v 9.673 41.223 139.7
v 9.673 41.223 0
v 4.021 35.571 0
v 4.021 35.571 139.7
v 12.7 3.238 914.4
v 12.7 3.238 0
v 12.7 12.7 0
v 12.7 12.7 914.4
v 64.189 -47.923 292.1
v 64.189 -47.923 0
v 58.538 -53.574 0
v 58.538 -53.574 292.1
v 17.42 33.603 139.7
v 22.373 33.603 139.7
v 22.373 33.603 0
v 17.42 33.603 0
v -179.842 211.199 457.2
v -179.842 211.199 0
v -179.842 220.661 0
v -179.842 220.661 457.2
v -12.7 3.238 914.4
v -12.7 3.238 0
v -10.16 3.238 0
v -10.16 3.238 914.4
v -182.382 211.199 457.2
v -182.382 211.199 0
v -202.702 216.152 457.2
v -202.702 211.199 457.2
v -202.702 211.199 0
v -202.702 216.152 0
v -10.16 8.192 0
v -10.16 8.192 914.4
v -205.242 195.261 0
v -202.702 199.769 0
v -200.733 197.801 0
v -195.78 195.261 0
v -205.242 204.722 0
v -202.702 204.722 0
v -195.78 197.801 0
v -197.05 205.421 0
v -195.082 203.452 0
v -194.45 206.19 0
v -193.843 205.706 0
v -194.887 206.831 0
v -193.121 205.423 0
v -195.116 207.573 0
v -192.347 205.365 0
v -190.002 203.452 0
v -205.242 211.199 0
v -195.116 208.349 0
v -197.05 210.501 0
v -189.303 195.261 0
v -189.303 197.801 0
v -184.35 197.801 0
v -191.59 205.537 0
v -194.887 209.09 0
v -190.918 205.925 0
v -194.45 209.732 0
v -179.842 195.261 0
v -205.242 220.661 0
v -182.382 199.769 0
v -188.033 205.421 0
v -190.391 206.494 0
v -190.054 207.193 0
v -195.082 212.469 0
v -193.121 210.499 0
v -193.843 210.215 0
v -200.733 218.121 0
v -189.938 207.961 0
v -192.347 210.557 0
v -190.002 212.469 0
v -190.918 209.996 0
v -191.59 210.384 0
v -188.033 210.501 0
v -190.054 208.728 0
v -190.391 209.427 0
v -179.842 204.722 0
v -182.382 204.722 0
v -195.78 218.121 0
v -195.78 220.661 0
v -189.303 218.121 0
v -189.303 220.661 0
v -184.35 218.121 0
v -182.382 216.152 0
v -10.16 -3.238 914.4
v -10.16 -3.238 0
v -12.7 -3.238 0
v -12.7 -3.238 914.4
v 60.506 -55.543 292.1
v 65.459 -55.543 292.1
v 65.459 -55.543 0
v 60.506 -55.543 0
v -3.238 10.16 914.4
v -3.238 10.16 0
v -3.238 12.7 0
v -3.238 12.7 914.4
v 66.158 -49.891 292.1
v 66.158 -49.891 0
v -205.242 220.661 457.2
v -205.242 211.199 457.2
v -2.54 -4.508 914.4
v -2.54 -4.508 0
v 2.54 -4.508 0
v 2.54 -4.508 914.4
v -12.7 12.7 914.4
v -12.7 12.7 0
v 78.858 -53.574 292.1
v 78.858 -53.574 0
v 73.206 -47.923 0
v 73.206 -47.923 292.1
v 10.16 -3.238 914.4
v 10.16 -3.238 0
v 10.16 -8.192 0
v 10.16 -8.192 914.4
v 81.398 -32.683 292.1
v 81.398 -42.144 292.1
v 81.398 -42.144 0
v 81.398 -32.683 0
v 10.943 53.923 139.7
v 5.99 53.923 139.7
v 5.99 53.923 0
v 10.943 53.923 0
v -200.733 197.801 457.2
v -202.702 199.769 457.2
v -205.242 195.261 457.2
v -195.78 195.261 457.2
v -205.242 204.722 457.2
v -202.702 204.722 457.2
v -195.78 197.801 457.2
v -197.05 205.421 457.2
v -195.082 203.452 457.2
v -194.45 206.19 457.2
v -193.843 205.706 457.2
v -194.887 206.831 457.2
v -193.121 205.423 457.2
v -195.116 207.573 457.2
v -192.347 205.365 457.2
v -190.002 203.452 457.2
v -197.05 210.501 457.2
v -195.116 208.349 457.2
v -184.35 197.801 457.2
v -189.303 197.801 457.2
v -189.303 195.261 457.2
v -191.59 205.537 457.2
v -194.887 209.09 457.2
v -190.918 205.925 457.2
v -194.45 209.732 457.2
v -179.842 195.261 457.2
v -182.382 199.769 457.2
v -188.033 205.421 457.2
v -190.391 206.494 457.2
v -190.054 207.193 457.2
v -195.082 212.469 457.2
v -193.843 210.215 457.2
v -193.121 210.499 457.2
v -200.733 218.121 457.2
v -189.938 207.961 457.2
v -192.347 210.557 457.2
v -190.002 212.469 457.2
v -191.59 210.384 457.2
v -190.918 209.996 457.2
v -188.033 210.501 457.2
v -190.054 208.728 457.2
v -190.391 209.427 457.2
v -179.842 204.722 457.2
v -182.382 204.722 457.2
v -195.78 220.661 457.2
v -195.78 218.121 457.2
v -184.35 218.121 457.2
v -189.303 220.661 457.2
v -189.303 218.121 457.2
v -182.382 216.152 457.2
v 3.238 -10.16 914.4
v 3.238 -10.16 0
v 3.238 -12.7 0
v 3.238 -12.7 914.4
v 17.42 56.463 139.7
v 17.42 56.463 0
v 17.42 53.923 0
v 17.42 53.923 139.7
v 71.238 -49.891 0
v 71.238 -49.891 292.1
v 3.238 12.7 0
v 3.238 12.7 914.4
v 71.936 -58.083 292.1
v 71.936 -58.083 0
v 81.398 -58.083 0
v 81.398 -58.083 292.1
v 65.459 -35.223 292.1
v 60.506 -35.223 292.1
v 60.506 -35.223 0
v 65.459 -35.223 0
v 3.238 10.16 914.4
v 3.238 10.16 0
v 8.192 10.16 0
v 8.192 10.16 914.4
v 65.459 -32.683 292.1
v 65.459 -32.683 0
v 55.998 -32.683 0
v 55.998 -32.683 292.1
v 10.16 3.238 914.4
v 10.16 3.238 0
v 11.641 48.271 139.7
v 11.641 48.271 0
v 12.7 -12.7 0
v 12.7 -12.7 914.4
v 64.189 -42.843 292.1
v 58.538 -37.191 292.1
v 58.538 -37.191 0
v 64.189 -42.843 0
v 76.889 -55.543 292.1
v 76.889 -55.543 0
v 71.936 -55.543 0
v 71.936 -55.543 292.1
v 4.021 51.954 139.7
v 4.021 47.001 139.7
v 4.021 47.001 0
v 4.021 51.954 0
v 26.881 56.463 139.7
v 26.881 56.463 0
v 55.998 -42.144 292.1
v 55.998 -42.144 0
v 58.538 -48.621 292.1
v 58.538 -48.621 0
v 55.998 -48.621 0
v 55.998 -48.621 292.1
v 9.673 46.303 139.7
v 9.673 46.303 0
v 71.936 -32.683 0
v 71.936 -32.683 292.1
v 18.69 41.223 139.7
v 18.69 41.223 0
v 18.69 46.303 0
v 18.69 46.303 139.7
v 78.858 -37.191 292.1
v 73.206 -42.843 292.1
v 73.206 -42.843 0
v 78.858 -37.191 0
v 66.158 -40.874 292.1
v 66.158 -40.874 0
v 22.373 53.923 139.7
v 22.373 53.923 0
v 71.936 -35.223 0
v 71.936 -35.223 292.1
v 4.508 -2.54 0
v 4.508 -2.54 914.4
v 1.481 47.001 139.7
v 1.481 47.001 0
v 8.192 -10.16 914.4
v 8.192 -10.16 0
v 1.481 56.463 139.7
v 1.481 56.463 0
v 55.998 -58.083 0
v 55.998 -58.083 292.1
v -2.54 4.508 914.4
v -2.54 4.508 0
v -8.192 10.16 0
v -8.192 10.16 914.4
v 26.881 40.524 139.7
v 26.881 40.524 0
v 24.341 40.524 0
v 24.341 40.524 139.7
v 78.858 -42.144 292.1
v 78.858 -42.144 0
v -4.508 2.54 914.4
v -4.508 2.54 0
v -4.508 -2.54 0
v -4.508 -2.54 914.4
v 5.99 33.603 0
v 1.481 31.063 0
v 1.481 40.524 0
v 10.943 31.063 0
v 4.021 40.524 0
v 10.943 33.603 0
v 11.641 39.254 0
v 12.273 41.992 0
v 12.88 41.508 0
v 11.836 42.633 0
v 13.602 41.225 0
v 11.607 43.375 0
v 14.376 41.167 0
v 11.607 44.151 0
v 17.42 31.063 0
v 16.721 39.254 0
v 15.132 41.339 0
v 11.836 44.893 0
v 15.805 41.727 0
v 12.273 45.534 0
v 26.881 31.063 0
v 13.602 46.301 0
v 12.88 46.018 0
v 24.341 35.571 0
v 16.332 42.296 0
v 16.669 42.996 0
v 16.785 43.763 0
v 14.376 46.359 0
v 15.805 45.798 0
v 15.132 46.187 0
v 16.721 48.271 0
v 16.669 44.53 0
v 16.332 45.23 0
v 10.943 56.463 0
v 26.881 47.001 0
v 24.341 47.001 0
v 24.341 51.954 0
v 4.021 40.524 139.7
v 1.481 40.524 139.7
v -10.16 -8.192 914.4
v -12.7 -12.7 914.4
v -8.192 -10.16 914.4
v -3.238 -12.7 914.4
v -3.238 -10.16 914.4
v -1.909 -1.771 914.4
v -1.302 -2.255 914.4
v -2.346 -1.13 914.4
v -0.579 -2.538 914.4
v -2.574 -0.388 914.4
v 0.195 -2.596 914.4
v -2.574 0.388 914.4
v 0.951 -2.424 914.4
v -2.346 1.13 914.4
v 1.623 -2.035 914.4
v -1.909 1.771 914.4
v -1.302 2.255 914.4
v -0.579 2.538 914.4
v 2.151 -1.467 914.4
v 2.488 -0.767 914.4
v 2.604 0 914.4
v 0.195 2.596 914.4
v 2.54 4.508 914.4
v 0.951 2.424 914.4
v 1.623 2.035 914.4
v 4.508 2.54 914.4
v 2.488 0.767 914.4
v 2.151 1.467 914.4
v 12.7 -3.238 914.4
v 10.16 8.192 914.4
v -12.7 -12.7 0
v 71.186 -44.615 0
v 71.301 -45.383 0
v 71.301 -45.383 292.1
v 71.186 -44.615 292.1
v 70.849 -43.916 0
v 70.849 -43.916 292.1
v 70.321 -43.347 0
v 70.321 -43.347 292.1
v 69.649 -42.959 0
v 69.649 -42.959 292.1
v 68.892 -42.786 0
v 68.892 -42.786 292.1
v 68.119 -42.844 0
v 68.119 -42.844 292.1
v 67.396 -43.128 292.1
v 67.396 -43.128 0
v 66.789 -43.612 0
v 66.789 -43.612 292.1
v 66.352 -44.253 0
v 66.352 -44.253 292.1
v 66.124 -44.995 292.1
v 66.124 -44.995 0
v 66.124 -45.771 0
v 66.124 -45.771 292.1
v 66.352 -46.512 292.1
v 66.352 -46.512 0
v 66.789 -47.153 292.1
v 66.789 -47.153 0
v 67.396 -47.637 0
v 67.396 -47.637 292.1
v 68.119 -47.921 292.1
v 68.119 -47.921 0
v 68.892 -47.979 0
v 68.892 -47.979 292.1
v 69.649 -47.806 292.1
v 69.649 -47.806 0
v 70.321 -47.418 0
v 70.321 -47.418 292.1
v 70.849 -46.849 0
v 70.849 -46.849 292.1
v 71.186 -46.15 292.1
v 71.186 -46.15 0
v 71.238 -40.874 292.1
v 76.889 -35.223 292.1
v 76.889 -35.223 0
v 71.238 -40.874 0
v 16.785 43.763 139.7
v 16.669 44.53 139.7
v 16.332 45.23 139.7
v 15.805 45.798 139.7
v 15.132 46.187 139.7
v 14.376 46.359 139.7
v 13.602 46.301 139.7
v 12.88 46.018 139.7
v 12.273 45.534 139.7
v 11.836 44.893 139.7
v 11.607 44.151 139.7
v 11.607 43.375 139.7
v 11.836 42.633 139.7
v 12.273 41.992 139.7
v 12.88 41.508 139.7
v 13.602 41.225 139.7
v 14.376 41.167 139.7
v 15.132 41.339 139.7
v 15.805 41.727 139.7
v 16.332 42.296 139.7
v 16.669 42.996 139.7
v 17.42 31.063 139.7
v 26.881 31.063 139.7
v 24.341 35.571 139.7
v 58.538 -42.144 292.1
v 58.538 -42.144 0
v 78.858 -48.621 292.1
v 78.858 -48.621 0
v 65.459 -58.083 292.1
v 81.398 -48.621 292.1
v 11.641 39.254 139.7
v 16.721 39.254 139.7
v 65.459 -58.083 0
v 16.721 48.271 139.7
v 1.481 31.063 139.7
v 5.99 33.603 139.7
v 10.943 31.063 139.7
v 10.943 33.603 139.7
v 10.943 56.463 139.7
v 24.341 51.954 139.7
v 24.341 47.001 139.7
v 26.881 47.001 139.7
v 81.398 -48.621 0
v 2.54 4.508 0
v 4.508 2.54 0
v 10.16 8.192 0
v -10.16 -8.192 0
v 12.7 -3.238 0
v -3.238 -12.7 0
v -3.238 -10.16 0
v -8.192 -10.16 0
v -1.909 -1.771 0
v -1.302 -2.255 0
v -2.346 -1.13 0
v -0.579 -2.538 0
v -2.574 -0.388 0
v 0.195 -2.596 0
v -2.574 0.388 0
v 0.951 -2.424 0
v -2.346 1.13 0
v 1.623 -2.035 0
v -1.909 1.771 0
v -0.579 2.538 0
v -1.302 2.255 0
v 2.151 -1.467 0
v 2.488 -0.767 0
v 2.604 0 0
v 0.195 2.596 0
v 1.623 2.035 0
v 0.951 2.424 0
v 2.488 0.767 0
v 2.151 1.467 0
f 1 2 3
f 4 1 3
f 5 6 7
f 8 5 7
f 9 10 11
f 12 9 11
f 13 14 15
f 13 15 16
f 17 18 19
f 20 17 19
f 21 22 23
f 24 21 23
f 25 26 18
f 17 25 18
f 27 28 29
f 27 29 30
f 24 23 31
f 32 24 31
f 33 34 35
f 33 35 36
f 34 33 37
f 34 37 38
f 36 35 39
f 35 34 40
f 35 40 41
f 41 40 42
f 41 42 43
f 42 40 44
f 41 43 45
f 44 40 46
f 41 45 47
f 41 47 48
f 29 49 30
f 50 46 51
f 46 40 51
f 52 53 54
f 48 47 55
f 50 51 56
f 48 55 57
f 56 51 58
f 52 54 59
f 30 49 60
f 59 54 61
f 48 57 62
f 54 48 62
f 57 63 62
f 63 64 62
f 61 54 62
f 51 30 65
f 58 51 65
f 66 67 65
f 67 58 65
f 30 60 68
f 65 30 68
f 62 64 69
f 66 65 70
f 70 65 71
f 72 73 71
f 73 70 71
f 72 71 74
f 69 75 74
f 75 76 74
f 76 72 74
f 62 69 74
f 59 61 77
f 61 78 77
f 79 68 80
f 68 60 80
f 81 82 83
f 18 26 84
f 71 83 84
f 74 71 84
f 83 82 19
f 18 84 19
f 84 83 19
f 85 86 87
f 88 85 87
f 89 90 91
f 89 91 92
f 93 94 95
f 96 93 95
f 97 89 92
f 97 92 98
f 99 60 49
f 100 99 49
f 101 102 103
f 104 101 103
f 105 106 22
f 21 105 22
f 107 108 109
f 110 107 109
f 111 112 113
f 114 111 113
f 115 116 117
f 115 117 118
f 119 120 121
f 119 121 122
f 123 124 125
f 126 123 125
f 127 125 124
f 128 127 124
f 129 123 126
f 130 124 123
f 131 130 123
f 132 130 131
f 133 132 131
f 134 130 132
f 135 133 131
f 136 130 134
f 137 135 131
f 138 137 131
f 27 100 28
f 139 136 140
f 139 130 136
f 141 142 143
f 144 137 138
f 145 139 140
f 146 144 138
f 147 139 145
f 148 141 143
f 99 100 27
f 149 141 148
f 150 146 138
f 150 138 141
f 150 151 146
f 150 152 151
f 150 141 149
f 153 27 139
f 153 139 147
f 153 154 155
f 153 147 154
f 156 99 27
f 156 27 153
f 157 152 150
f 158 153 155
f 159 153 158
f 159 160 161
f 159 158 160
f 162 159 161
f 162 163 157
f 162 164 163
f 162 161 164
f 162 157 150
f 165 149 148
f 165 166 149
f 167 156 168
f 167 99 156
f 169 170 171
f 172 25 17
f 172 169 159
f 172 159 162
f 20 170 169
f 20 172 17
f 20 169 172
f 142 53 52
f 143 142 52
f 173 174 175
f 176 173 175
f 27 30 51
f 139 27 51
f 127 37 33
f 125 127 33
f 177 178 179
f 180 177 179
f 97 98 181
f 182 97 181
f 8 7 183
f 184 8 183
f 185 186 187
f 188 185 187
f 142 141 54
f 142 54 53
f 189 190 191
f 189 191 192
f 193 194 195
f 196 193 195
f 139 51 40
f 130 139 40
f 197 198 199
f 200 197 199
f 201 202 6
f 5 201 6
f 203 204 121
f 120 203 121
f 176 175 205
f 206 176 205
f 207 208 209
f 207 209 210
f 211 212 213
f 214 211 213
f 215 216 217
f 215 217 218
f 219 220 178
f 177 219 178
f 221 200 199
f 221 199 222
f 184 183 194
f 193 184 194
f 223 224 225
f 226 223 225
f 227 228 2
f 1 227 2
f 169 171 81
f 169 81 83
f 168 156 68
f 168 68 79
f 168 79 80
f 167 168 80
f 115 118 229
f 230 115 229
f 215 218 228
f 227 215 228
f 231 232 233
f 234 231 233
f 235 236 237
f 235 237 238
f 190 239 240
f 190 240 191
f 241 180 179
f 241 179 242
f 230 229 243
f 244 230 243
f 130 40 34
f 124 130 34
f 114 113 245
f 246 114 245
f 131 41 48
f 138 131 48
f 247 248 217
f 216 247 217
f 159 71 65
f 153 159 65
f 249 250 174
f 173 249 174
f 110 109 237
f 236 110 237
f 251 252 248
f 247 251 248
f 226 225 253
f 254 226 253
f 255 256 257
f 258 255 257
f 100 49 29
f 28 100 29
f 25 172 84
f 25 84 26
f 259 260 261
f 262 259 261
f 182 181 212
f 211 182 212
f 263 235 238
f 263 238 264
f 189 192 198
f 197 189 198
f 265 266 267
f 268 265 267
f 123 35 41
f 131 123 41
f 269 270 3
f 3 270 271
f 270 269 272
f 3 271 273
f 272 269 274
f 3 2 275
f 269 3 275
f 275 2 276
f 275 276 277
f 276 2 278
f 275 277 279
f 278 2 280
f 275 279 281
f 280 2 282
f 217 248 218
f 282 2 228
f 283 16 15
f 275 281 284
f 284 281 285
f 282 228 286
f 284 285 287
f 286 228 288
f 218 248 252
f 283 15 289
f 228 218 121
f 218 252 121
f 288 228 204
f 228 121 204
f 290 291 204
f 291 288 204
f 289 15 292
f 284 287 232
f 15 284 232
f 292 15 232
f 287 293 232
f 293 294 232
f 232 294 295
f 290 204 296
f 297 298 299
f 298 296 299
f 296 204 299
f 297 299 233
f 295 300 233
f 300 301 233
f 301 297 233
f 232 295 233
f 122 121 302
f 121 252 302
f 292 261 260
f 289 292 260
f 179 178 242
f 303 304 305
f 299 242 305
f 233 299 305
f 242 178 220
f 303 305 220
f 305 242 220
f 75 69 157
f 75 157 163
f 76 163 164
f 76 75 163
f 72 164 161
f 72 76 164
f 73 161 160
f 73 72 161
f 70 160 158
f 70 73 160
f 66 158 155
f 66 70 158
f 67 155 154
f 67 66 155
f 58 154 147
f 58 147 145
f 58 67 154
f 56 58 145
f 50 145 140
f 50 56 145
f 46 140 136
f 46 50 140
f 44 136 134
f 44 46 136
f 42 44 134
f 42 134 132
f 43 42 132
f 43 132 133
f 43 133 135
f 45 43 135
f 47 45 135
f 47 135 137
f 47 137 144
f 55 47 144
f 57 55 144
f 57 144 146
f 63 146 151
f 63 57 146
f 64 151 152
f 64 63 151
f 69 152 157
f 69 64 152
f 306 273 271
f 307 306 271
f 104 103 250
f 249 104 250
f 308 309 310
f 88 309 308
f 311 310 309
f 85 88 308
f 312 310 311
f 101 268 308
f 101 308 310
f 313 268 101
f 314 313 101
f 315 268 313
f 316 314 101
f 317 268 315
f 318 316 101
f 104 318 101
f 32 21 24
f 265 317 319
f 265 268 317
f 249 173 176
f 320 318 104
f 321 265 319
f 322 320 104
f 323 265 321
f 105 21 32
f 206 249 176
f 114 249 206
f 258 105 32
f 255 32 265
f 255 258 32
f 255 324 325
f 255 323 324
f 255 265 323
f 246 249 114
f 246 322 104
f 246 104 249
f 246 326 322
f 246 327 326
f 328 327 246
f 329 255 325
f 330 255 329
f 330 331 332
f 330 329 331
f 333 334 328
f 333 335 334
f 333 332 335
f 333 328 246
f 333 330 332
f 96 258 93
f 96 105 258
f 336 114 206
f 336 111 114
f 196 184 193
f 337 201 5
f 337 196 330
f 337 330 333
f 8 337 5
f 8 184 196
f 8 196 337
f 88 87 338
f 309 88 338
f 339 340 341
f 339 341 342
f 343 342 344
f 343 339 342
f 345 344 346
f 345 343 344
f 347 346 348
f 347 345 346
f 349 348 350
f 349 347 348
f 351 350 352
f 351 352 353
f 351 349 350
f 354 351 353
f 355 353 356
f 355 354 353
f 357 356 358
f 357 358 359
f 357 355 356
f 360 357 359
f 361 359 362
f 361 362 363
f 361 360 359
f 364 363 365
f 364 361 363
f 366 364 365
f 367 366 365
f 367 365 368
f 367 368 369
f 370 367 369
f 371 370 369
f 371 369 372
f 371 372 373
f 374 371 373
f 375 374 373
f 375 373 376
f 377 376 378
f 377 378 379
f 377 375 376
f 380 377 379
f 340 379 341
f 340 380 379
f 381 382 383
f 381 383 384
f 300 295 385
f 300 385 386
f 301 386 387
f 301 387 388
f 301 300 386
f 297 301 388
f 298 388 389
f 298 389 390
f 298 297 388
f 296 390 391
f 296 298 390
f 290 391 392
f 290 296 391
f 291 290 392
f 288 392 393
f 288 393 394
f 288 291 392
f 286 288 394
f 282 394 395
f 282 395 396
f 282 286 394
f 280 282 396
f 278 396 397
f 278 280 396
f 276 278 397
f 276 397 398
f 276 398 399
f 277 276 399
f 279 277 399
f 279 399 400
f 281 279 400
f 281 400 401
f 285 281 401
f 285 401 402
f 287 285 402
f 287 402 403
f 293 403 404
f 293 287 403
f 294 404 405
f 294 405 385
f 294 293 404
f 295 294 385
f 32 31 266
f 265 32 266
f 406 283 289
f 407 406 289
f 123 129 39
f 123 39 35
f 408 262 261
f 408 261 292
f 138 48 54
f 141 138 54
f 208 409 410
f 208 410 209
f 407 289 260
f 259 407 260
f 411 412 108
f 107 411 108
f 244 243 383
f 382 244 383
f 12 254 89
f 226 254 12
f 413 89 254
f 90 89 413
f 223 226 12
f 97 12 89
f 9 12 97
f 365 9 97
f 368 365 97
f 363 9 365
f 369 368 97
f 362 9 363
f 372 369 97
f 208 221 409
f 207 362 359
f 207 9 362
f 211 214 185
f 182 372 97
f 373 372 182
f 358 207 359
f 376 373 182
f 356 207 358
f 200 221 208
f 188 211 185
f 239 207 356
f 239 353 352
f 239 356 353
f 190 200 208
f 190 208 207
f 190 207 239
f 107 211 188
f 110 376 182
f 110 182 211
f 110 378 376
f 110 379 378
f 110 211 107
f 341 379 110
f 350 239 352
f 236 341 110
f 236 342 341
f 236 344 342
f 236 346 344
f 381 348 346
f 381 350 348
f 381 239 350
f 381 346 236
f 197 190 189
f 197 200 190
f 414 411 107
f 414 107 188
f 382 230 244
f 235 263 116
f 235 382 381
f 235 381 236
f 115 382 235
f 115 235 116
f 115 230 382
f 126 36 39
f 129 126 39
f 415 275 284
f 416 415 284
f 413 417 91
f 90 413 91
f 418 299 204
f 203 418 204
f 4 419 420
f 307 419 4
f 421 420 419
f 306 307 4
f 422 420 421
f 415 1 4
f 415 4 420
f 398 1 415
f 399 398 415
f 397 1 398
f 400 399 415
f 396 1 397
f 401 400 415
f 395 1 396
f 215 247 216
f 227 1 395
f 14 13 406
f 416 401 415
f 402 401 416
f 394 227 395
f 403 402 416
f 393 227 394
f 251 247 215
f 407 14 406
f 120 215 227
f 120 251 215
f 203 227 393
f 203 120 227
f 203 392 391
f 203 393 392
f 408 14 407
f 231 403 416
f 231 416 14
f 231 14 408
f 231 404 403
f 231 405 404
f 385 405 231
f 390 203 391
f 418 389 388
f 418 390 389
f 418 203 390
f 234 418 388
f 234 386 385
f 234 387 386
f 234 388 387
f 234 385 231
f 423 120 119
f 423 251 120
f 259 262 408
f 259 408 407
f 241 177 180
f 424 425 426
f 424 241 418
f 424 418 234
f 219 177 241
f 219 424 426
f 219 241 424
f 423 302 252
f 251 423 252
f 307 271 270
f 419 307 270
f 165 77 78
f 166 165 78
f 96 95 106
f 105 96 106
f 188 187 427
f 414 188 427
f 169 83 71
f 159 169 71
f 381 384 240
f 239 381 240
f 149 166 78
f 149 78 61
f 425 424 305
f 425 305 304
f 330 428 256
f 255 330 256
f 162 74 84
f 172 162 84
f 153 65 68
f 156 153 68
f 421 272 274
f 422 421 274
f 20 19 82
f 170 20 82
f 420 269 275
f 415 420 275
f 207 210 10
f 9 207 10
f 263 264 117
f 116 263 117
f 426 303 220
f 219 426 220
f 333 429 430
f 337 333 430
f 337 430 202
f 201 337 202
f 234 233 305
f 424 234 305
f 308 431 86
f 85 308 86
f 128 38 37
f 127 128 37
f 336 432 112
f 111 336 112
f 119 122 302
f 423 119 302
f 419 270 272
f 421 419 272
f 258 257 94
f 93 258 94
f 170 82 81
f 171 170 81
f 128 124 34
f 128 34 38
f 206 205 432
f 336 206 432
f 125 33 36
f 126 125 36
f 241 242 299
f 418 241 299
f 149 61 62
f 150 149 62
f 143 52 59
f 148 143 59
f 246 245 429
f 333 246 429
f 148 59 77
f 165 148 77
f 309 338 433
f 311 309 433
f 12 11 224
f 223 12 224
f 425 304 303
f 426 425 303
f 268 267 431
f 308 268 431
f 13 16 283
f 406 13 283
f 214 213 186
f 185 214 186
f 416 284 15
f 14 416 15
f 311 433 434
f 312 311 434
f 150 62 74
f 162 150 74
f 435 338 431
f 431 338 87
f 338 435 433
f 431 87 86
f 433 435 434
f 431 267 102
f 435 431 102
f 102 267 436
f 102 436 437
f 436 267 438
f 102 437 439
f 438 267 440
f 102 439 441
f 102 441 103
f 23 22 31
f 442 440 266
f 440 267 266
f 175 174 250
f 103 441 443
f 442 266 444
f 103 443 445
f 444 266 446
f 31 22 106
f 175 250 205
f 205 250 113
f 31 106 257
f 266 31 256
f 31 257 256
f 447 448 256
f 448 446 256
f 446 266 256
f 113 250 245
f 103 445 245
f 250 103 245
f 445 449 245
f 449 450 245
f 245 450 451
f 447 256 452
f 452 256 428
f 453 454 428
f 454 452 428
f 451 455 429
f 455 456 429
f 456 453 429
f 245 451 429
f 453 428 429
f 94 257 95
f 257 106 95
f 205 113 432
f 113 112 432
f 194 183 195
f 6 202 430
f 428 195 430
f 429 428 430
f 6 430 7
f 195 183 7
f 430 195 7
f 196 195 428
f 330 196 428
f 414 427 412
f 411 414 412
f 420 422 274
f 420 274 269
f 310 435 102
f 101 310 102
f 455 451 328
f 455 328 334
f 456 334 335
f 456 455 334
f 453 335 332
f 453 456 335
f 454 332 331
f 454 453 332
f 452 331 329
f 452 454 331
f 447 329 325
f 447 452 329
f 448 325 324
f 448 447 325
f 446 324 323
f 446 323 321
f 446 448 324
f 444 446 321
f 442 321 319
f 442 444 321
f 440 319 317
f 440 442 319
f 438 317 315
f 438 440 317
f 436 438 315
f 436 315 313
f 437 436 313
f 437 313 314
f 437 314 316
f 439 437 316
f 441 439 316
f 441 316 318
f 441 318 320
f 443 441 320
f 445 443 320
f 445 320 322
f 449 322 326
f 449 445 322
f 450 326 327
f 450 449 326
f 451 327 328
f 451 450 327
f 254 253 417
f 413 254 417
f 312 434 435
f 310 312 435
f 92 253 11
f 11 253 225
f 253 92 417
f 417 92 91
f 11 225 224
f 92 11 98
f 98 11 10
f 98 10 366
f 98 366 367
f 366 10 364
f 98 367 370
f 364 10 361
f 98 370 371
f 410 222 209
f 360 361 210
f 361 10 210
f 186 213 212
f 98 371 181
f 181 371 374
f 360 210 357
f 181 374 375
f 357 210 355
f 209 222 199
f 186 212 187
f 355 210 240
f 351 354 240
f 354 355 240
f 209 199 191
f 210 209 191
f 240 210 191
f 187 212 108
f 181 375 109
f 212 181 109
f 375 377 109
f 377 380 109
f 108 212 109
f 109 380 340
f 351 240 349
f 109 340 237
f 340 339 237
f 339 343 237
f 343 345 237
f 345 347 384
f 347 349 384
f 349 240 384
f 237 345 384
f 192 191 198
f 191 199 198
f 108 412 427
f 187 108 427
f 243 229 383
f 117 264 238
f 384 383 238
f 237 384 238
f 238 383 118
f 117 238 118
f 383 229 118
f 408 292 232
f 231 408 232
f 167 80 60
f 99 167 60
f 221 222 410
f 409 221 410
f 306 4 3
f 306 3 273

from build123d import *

# Parameters (mm, degrees)
F0_R     = 2.6035
F1_DEPTH = 914.4
F2_R     = 2.6035
F3_DEPTH = 292.1
F4_R     = 2.6035
F5_DEPTH = 139.7
F6_R     = 2.6035
F7_DEPTH = 457.2


with BuildPart() as f1:
    # F0 (on Top) → F1 (new body)
    with BuildSketch(Plane.XY):
        Polygon((2.54, 4.5085), (-2.54, 4.5085), (-8.1915, 10.16), (-3.2385, 10.16), (-3.2385, 12.7), (-12.7, 12.7), (-12.7, 3.2385), (-10.16, 3.2385), (-10.16, 8.1915), (-4.5085, 2.54), (-4.5085, -2.54), (-10.16, -8.1915), (-10.16, -3.2385), (-12.7, -3.2385), (-12.7, -12.7), (-3.2385, -12.7), (-3.2385, -10.16), (-8.1915, -10.16), (-2.54, -4.5085), (2.54, -4.5085), (8.1915, -10.16), (3.2385, -10.16), (3.2385, -12.7), (12.7, -12.7), (12.7, -3.2385), (10.16, -3.2385), (10.16, -8.1915), (4.5085, -2.54), (4.5085, 2.54), (10.16, 8.1915), (10.16, 3.2385), (12.7, 3.2385), (12.7, 12.7), (3.2385, 12.7), (3.2385, 10.16), (8.1915, 10.16), align=None)
        Circle(F0_R, mode=Mode.SUBTRACT)
    extrude(amount=F1_DEPTH)


with BuildPart() as f3:
    # F2 (on Top) → F3 (new body)
    with BuildSketch(Plane.XY):
        Polygon((71.23793, -40.874071), (66.15793, -40.874071), (60.50643, -35.222571), (65.45943, -35.222571), (65.45943, -32.682571), (55.99793, -32.682571), (55.99793, -42.144071), (58.53793, -42.144071), (58.53793, -37.191071), (64.18943, -42.842571), (64.18943, -47.922571), (58.53793, -53.574071), (58.53793, -48.621071), (55.99793, -48.621071), (55.99793, -58.082571), (65.45943, -58.082571), (65.45943, -55.542571), (60.50643, -55.542571), (66.15793, -49.891071), (71.23793, -49.891071), (76.88943, -55.542571), (71.93643, -55.542571), (71.93643, -58.082571), (81.39793, -58.082571), (81.39793, -48.621071), (78.85793, -48.621071), (78.85793, -53.574071), (73.20643, -47.922571), (73.20643, -42.842571), (78.85793, -37.191071), (78.85793, -42.144071), (81.39793, -42.144071), (81.39793, -32.682571), (71.93643, -32.682571), (71.93643, -35.222571), (76.88943, -35.222571), align=None)
        with Locations((68.69793, -45.382571)):
            Circle(F2_R, mode=Mode.SUBTRACT)
    extrude(amount=F3_DEPTH)


with BuildPart() as f5:
    # F4 (on Top) → F5 (new body)
    with BuildSketch(Plane.XY):
        Polygon((16.721279, 48.271485), (11.641279, 48.271485), (5.989779, 53.922985), (10.942779, 53.922985), (10.942779, 56.462985), (1.481279, 56.462985), (1.481279, 47.001485), (4.021279, 47.001485), (4.021279, 51.954485), (9.672779, 46.302985), (9.672779, 41.222985), (4.021279, 35.571485), (4.021279, 40.524485), (1.481279, 40.524485), (1.481279, 31.062985), (10.942779, 31.062985), (10.942779, 33.602985), (5.989779, 33.602985), (11.641279, 39.254485), (16.721279, 39.254485), (22.372779, 33.602985), (17.419779, 33.602985), (17.419779, 31.062985), (26.881279, 31.062985), (26.881279, 40.524485), (24.341279, 40.524485), (24.341279, 35.571485), (18.689779, 41.222985), (18.689779, 46.302985), (24.341279, 51.954485), (24.341279, 47.001485), (26.881279, 47.001485), (26.881279, 56.462985), (17.419779, 56.462985), (17.419779, 53.922985), (22.372779, 53.922985), align=None)
        with Locations((14.181279, 43.762985)):
            Circle(F4_R, mode=Mode.SUBTRACT)
    extrude(amount=F5_DEPTH)


with BuildPart() as f7:
    # F6 (on Top) → F7 (new body)
    with BuildSketch(Plane.XY):
        Polygon((-190.001651, 212.469231), (-195.081651, 212.469231), (-200.733151, 218.120731), (-195.780151, 218.120731), (-195.780151, 220.660731), (-205.241651, 220.660731), (-205.241651, 211.199231), (-202.701651, 211.199231), (-202.701651, 216.152231), (-197.050151, 210.500731), (-197.050151, 205.420731), (-202.701651, 199.769231), (-202.701651, 204.722231), (-205.241651, 204.722231), (-205.241651, 195.260731), (-195.780151, 195.260731), (-195.780151, 197.800731), (-200.733151, 197.800731), (-195.081651, 203.452231), (-190.001651, 203.452231), (-184.350151, 197.800731), (-189.303151, 197.800731), (-189.303151, 195.260731), (-179.841651, 195.260731), (-179.841651, 204.722231), (-182.381651, 204.722231), (-182.381651, 199.769231), (-188.033151, 205.420731), (-188.033151, 210.500731), (-182.381651, 216.152231), (-182.381651, 211.199231), (-179.841651, 211.199231), (-179.841651, 220.660731), (-189.303151, 220.660731), (-189.303151, 218.120731), (-184.350151, 218.120731), align=None)
        with Locations((-192.541651, 207.960731)):
            Circle(F6_R, mode=Mode.SUBTRACT)
    extrude(amount=F7_DEPTH)


solid = Compound([f1.part, f3.part, f5.part, f7.part])
